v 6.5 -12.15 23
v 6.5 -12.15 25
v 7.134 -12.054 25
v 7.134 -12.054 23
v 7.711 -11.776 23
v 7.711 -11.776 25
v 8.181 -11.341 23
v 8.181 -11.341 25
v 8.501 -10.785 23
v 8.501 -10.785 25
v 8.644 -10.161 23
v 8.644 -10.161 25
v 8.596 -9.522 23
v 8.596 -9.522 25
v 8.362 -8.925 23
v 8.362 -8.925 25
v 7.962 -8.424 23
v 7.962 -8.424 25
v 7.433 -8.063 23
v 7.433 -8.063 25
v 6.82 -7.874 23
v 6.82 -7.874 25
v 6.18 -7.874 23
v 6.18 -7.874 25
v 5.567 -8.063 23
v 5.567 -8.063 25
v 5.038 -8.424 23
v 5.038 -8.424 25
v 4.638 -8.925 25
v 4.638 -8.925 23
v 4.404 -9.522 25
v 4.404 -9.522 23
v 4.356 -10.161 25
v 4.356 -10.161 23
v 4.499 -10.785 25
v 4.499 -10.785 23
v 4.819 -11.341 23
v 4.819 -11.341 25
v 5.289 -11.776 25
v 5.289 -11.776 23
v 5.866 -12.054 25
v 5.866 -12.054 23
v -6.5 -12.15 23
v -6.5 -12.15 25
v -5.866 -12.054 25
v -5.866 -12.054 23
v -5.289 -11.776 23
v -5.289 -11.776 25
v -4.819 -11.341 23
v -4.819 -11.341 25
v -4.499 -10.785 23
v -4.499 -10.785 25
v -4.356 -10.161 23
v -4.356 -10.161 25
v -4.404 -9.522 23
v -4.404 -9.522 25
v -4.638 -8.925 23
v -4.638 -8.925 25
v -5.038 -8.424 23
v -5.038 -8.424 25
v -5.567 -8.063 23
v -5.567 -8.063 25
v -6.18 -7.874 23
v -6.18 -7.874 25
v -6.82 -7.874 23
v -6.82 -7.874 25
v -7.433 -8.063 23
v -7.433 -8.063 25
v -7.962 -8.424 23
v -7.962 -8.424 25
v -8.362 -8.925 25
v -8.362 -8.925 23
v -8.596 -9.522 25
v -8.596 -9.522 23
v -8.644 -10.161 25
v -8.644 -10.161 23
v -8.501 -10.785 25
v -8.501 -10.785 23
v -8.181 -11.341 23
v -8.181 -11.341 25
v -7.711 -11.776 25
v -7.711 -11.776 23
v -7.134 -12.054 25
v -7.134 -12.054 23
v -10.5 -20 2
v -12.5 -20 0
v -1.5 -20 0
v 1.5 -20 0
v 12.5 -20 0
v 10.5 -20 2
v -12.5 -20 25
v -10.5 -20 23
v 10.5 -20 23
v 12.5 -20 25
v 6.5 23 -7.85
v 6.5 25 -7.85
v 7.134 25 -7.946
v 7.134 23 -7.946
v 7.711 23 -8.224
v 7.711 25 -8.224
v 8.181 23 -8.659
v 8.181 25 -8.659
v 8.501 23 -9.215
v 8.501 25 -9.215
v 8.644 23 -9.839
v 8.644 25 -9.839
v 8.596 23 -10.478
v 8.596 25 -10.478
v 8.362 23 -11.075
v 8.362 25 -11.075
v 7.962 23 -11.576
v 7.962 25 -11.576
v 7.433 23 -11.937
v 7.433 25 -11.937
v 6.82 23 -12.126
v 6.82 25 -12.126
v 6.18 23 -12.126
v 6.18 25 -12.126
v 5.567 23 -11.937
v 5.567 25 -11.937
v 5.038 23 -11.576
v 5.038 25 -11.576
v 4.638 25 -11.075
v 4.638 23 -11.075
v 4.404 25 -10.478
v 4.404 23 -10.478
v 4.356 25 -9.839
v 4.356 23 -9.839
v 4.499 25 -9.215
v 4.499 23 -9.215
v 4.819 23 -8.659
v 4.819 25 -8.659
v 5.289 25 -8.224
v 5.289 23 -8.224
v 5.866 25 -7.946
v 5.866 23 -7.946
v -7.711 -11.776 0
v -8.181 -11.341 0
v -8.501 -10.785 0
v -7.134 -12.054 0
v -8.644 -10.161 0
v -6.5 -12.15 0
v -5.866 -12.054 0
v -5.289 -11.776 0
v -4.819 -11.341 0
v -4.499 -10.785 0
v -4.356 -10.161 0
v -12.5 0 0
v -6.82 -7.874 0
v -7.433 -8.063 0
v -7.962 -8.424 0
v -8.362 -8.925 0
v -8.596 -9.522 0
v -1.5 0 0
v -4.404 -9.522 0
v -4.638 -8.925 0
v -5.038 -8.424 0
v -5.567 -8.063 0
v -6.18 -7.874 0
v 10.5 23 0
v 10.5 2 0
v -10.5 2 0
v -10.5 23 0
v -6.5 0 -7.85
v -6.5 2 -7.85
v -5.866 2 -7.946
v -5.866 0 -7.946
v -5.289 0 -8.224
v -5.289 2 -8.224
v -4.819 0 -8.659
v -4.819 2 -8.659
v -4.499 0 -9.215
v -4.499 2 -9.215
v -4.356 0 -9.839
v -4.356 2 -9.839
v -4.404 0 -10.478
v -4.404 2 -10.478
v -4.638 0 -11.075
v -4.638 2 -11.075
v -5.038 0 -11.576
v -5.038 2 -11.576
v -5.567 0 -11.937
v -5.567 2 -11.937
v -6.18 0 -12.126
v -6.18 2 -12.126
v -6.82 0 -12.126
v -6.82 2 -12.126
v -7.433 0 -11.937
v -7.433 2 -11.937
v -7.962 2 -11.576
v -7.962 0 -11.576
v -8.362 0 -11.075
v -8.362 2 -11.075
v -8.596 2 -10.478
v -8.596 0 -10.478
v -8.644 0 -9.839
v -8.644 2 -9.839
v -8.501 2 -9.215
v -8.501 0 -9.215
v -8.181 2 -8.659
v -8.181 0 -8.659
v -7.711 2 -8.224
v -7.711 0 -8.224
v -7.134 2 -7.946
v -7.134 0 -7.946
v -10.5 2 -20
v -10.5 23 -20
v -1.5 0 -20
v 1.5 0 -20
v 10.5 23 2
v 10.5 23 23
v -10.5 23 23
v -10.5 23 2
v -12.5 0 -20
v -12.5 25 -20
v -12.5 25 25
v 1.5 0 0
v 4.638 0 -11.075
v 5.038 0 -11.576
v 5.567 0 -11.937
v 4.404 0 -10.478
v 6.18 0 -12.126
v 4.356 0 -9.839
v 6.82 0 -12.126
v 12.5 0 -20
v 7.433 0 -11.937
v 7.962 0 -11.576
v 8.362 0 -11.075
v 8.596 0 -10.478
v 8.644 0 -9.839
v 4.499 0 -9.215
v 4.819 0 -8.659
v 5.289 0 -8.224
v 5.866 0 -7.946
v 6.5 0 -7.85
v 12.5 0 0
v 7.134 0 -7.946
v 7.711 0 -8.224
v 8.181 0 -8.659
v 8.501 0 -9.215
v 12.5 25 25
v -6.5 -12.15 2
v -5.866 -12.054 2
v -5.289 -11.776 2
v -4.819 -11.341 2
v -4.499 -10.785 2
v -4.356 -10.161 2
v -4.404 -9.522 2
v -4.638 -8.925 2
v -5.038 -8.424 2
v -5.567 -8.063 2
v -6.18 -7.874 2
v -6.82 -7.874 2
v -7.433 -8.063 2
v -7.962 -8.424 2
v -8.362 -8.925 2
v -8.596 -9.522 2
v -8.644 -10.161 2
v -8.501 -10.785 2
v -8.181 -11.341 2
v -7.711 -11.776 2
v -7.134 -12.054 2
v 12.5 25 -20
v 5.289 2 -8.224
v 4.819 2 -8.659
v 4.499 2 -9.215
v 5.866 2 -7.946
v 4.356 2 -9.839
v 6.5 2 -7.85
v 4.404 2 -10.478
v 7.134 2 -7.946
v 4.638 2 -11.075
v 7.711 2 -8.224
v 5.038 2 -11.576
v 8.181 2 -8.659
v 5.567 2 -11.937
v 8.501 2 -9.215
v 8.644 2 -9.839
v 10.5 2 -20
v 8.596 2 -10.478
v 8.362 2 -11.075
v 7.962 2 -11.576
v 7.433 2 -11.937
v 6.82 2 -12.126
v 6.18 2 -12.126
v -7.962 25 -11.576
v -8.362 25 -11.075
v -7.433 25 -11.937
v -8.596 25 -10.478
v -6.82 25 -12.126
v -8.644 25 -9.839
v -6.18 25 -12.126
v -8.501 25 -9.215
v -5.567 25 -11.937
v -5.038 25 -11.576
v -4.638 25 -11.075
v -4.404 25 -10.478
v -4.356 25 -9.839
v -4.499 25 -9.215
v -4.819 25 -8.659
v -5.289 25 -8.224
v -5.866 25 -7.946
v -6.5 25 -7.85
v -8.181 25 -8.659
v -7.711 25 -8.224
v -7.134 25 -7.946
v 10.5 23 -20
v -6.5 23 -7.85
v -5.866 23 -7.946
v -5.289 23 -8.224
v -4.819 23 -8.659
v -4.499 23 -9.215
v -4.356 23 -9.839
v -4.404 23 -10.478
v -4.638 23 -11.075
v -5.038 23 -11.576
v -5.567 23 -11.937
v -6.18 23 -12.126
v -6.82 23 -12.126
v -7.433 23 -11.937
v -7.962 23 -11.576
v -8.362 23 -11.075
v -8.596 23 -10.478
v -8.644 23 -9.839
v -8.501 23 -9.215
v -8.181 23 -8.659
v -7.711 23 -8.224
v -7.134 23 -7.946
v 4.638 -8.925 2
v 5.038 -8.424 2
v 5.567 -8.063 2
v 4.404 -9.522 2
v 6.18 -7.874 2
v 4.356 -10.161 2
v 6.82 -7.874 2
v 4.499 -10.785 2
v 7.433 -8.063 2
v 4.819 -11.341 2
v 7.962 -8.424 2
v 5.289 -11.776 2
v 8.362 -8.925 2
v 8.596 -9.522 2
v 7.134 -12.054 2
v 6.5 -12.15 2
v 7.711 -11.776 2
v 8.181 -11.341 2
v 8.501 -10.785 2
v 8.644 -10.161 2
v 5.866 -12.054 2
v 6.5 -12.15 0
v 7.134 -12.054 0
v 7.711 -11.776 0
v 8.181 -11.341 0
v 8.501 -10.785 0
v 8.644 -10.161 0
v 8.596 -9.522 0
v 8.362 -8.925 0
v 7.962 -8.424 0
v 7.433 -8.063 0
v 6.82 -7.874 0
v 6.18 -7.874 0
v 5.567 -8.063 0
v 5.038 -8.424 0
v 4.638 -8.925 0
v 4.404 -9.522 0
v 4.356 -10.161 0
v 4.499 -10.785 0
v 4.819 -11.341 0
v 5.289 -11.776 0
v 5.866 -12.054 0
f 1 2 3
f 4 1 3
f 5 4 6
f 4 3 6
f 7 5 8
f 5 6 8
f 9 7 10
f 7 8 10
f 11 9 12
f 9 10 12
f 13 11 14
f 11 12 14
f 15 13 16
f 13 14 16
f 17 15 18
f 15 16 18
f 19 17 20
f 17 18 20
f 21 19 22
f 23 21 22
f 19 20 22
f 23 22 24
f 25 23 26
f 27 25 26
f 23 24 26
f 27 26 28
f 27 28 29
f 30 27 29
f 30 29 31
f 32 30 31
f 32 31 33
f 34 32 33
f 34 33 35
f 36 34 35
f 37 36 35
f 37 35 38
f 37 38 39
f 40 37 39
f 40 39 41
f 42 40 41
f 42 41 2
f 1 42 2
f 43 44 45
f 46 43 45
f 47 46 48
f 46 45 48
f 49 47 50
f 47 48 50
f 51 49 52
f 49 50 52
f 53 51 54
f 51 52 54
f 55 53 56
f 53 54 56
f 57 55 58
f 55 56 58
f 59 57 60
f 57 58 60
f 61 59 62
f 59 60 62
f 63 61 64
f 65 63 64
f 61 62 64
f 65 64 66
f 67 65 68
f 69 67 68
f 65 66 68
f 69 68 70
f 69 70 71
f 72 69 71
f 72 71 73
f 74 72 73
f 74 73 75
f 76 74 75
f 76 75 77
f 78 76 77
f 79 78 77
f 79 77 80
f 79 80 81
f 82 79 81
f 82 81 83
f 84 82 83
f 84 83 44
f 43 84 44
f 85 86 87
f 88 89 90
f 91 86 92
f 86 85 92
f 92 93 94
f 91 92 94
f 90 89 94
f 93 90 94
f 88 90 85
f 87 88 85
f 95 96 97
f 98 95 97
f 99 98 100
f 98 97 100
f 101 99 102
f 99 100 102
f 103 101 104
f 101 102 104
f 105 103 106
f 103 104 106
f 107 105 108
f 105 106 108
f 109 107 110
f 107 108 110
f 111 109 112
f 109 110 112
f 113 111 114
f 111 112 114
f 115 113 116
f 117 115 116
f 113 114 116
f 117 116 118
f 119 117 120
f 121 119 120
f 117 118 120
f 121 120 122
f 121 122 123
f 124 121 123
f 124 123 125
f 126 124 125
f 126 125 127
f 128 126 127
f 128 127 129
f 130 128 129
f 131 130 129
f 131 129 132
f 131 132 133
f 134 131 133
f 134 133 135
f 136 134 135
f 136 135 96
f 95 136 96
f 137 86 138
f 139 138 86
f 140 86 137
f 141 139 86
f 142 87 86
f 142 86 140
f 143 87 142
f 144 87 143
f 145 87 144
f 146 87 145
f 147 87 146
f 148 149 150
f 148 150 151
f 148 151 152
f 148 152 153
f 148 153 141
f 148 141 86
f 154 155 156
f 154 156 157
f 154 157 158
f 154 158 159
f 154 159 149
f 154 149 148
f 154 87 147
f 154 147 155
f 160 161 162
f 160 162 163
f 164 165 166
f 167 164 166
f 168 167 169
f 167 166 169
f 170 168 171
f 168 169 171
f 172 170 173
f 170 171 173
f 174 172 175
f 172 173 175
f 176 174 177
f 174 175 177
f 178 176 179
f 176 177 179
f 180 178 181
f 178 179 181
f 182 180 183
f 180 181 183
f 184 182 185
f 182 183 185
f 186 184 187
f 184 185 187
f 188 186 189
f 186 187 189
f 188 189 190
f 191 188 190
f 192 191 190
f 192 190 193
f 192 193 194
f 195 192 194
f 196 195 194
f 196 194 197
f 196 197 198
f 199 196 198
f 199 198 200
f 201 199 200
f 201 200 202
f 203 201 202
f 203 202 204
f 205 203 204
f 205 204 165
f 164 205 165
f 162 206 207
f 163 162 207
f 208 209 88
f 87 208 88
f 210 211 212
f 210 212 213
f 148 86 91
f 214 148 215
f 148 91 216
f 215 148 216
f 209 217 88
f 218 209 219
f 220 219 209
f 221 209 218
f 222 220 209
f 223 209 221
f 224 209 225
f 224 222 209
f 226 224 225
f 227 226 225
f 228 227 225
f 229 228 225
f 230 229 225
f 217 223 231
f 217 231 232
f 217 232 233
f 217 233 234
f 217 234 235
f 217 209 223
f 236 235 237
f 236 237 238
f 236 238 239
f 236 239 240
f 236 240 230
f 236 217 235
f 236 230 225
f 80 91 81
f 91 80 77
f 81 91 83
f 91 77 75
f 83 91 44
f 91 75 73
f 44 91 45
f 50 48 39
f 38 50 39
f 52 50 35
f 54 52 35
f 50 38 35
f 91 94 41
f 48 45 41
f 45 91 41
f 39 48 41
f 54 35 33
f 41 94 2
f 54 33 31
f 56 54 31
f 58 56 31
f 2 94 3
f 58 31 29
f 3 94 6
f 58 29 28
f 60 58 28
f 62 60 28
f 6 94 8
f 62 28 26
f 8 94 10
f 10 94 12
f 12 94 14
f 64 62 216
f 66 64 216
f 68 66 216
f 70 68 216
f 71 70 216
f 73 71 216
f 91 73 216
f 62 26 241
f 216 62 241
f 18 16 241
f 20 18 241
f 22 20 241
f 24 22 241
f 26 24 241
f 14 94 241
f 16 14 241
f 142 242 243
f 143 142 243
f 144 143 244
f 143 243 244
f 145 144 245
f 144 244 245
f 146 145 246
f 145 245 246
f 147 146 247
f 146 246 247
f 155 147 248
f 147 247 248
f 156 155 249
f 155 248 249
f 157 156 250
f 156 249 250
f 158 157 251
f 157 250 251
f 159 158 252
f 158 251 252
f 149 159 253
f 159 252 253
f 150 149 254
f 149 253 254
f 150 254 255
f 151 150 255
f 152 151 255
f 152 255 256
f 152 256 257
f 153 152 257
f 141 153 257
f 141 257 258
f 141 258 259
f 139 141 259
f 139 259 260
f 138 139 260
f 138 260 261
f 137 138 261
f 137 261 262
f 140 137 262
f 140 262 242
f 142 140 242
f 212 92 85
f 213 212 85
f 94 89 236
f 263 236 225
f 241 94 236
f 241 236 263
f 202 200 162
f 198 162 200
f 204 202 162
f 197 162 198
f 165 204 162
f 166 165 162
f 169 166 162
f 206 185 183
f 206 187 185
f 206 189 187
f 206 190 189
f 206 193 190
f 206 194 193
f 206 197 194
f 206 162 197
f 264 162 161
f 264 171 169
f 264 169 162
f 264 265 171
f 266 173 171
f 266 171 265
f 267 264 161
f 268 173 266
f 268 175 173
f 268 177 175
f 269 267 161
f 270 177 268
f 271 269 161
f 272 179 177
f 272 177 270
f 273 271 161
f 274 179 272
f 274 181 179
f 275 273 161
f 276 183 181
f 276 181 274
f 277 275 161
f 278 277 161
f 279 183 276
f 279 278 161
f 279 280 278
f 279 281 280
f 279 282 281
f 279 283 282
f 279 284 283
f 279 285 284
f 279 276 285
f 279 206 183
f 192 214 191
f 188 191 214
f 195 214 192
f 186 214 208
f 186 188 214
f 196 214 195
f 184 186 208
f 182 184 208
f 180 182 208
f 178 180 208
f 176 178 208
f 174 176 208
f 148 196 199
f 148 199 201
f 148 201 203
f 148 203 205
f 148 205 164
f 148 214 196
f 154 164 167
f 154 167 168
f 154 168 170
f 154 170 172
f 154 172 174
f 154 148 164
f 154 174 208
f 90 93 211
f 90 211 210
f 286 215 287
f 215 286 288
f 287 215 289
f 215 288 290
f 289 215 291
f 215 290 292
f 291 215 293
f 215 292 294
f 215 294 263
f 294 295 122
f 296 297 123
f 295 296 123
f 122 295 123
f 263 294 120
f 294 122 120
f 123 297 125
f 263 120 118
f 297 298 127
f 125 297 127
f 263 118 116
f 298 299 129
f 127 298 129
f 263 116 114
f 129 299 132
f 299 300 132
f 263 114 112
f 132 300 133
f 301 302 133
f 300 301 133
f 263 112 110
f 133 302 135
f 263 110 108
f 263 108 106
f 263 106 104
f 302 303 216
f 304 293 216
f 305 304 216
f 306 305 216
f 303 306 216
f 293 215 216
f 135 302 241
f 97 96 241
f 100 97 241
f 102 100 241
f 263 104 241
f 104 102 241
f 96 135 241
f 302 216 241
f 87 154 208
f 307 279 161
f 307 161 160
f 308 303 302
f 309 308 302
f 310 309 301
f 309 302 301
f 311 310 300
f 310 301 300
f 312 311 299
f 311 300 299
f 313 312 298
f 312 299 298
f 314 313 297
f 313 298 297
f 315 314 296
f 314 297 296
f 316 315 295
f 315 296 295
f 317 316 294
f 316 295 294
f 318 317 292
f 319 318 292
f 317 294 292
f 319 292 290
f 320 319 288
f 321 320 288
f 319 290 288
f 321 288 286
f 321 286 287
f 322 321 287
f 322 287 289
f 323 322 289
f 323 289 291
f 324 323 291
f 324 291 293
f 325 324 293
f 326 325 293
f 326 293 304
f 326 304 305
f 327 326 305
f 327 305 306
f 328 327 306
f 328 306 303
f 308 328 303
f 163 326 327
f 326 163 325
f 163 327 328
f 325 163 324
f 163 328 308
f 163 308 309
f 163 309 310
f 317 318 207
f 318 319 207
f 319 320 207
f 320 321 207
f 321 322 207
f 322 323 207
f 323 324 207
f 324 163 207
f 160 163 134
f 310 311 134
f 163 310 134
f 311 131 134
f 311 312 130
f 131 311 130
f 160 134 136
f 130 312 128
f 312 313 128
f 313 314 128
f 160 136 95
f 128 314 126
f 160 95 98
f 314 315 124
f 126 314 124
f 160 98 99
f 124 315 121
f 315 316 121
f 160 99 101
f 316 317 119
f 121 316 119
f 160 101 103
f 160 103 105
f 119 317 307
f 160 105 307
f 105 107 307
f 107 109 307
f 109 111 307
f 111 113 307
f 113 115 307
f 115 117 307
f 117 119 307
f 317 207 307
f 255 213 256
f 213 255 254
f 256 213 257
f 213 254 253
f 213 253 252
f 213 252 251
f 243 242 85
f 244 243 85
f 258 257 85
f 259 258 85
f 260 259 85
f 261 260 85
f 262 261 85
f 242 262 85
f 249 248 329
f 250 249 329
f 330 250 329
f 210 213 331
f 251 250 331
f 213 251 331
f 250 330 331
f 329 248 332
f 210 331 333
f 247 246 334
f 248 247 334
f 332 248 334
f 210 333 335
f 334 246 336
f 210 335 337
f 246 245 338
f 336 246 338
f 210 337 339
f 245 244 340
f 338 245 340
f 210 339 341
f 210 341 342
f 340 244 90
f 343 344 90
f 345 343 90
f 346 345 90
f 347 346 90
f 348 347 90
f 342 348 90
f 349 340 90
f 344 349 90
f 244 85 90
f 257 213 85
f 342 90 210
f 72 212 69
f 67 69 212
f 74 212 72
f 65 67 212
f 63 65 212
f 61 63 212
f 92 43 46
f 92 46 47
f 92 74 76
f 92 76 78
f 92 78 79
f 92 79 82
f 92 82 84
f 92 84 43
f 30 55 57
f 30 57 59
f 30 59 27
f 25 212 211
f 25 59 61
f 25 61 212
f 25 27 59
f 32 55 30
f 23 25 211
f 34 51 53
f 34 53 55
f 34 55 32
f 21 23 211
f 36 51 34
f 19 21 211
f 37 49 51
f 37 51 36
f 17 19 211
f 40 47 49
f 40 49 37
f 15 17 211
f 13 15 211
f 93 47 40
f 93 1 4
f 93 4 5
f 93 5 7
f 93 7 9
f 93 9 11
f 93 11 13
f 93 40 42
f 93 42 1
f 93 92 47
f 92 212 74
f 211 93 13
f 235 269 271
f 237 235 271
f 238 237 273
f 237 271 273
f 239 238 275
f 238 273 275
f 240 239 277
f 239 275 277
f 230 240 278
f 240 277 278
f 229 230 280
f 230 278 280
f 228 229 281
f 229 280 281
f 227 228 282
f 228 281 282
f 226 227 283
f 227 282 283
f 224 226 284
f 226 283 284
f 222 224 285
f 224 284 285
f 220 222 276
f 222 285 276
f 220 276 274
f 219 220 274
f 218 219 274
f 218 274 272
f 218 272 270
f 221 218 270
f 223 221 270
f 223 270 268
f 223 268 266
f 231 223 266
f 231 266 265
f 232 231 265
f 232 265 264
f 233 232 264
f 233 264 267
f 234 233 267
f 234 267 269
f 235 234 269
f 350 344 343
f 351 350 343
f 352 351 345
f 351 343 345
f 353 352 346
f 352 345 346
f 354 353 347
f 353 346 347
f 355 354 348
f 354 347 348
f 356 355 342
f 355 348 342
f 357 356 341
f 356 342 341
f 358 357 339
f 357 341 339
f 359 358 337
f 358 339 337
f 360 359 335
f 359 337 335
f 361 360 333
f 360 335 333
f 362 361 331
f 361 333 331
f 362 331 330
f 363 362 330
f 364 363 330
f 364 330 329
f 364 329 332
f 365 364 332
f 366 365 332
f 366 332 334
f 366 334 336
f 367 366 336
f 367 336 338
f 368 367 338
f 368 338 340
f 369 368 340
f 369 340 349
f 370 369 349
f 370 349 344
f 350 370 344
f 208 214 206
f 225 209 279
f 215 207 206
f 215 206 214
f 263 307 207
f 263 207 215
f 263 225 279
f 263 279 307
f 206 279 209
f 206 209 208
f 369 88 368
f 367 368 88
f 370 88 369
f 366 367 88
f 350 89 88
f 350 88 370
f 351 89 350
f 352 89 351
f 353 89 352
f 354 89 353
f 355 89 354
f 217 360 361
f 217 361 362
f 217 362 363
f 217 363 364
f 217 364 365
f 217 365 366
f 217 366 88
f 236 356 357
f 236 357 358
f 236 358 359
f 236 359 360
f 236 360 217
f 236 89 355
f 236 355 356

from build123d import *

# Parameters (mm, degrees)
SKETCH_W        = 45
SKETCH_H        = 25
PAD_DEPTH       = 12.5
SKETCH001_W     = 25
SKETCH001_H     = 25
PAD001_DEPTH    = 20
PAD002_DEPTH    = 1.5
SKETCH005_W     = 21
SKETCH005_H     = 21
POCKET_DEPTH    = 43
SKETCH006_W     = 21
SKETCH006_H     = 21
POCKET001_DEPTH = 20
SKETCH007_R     = 2.15
POCKET002_DEPTH = 45.001
SKETCH008_R     = 2.15
POCKET003_DEPTH = 45.001


with BuildPart() as part:
    # Sketch → Pad (new body, symmetric)
    with BuildSketch(Plane.YZ):
        with Locations((2.5, 12.5)):
            Rectangle(SKETCH_W, SKETCH_H)
    extrude(amount=PAD_DEPTH, both=True)

    # Sketch001 (on Face3 of Pad) → Pad001 (join)
    with BuildSketch(Plane.YX):
        with Locations((12.5, 0)):
            Rectangle(SKETCH001_W, SKETCH001_H)
    extrude(amount=PAD001_DEPTH)

    # Sketch004 → Pad002 (join, symmetric)
    with BuildSketch(Plane.YZ):
        Polygon((-20, 0), (0, 0), (0, -20), align=None)
    extrude(amount=PAD002_DEPTH, both=True)

    # Sketch005 (on Face2 of Pad002) → Pocket (cut)
    with BuildSketch(Plane(origin=(0, -20, 0), x_dir=(0, 0, -1), z_dir=(0, -1, 0))):
        with Locations((-12.5, 0)):
            Rectangle(SKETCH005_W, SKETCH005_H)
    extrude(amount=-POCKET_DEPTH, mode=Mode.SUBTRACT)

    # Sketch006 (on Face13 of Pocket) → Pocket001 (cut)
    with BuildSketch(Plane.YX.offset(20)):
        with Locations((12.5, 0)):
            Rectangle(SKETCH006_W, SKETCH006_H)
    extrude(amount=-POCKET001_DEPTH, mode=Mode.SUBTRACT)

    # Sketch007 (on Face3 of Pocket001) → Pocket002 (cut, through all)
    with BuildSketch(Plane.ZX.offset(25)):
        with Locations((-10, 6.5)):
            Circle(SKETCH007_R)
        with Locations((-10, -6.5)):
            Circle(SKETCH007_R)
    extrude(amount=-POCKET002_DEPTH, mode=Mode.SUBTRACT)

    # Sketch008 (on Face1 of Pocket002) → Pocket003 (cut, through all)
    with BuildSketch(Plane(origin=(0, 0, 25), x_dir=(0, -1, 0), z_dir=(0, 0, 1))):
        with Locations((10, 6.5)):
            Circle(SKETCH008_R)
        with Locations((10, -6.5)):
            Circle(SKETCH008_R)
    extrude(amount=-POCKET003_DEPTH, mode=Mode.SUBTRACT)


solid = part.part
